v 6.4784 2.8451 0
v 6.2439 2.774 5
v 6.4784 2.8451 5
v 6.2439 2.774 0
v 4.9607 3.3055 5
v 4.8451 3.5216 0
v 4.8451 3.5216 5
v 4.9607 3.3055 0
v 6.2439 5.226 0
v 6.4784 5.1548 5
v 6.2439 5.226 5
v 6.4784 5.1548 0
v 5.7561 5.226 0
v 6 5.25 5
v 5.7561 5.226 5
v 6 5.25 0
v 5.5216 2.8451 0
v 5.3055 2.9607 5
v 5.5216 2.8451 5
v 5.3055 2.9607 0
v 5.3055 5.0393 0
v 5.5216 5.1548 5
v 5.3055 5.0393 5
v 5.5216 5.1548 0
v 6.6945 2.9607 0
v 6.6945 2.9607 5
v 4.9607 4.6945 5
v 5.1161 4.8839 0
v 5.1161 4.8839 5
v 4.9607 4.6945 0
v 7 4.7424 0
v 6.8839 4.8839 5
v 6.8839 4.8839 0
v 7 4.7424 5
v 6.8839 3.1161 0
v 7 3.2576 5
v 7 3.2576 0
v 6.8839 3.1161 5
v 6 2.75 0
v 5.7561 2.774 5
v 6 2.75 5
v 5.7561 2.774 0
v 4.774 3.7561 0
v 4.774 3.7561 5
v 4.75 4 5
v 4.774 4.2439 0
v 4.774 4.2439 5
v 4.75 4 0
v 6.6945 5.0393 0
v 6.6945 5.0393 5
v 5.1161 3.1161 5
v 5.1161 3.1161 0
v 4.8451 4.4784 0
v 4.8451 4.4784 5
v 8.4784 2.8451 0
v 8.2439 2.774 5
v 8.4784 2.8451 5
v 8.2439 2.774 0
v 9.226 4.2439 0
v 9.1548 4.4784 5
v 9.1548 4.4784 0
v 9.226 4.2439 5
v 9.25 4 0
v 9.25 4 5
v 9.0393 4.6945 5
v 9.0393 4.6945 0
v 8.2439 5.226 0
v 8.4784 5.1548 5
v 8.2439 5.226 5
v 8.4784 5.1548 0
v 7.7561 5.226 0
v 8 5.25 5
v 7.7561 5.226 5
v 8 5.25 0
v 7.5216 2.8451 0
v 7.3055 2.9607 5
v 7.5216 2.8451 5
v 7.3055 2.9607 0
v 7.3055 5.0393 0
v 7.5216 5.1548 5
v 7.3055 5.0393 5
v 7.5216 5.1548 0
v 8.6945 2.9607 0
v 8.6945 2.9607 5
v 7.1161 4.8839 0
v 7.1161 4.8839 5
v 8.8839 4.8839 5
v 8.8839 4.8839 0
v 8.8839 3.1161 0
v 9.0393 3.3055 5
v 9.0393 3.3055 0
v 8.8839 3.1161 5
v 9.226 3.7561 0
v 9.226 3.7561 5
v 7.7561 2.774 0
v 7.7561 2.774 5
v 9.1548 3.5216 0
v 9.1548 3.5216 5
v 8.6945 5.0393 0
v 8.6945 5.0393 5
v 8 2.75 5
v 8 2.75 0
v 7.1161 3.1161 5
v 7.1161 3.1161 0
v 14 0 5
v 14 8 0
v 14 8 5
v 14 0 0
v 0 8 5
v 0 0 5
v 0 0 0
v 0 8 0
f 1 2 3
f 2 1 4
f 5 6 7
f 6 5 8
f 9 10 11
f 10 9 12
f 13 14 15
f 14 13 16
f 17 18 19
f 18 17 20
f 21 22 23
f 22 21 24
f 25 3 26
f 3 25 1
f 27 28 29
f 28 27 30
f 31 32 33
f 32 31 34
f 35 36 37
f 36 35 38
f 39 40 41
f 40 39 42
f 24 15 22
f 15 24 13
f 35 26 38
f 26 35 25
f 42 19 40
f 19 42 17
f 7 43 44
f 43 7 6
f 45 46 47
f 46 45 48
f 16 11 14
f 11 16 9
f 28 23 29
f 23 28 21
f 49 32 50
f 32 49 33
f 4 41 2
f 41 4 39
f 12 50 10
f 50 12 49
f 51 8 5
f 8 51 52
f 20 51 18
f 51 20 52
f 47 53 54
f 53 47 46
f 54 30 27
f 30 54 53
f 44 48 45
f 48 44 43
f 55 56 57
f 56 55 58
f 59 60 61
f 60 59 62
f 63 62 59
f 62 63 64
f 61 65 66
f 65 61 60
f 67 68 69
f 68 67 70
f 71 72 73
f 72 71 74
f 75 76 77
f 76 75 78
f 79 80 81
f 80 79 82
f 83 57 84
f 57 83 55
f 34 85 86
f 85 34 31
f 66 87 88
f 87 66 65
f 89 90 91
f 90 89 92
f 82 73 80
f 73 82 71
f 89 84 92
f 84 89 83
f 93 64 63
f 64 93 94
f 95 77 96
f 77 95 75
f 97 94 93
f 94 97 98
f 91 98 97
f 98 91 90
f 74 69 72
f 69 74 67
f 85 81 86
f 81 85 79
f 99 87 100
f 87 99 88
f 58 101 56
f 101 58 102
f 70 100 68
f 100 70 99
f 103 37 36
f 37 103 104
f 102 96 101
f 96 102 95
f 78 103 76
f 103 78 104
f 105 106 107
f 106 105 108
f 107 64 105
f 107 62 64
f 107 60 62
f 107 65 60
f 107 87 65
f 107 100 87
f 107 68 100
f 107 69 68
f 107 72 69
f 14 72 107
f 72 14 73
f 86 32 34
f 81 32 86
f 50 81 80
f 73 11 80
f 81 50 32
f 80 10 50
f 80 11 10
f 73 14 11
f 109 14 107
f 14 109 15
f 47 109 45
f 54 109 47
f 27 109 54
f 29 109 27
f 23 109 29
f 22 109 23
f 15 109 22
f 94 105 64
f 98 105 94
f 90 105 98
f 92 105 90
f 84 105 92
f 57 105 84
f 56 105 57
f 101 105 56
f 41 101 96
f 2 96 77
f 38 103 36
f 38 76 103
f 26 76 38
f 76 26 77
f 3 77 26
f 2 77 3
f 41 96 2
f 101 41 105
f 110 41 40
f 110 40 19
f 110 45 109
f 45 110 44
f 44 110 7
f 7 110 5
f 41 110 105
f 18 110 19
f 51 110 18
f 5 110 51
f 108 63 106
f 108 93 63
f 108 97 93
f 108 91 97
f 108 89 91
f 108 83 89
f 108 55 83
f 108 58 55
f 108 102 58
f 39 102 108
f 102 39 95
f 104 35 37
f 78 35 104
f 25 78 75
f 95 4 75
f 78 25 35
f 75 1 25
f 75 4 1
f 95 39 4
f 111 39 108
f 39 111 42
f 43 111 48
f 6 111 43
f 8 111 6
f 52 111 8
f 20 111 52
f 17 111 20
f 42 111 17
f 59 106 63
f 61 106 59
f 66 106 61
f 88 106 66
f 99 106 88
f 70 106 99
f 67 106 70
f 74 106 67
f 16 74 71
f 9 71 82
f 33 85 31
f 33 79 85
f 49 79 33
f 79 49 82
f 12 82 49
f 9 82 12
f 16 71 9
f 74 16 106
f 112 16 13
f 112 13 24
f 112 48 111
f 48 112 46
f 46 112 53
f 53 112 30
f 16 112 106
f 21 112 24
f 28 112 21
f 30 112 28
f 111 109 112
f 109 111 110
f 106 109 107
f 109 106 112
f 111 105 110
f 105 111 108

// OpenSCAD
$fn = 32;

// ----------------------------------------------------------------------
// Micro pad: two-hole pad, 5-20 mm class
// ----------------------------------------------------------------------

// --- parameters (mm) ---
pad_l = 14;               // pad length, X
pad_w = 8;                // pad width, Y
pad_t = 5;                // pad thickness, Z
hole_d = 2.5;             // hole diameter
hole_x = 6;               // X of the first hole centre

difference() {
  cube([pad_l, pad_w, pad_t]);
  for (x = [hole_x, pad_l - hole_x])
    translate([x, pad_w / 2, -1])
      cylinder(h = pad_t + 2, d = hole_d);
}
